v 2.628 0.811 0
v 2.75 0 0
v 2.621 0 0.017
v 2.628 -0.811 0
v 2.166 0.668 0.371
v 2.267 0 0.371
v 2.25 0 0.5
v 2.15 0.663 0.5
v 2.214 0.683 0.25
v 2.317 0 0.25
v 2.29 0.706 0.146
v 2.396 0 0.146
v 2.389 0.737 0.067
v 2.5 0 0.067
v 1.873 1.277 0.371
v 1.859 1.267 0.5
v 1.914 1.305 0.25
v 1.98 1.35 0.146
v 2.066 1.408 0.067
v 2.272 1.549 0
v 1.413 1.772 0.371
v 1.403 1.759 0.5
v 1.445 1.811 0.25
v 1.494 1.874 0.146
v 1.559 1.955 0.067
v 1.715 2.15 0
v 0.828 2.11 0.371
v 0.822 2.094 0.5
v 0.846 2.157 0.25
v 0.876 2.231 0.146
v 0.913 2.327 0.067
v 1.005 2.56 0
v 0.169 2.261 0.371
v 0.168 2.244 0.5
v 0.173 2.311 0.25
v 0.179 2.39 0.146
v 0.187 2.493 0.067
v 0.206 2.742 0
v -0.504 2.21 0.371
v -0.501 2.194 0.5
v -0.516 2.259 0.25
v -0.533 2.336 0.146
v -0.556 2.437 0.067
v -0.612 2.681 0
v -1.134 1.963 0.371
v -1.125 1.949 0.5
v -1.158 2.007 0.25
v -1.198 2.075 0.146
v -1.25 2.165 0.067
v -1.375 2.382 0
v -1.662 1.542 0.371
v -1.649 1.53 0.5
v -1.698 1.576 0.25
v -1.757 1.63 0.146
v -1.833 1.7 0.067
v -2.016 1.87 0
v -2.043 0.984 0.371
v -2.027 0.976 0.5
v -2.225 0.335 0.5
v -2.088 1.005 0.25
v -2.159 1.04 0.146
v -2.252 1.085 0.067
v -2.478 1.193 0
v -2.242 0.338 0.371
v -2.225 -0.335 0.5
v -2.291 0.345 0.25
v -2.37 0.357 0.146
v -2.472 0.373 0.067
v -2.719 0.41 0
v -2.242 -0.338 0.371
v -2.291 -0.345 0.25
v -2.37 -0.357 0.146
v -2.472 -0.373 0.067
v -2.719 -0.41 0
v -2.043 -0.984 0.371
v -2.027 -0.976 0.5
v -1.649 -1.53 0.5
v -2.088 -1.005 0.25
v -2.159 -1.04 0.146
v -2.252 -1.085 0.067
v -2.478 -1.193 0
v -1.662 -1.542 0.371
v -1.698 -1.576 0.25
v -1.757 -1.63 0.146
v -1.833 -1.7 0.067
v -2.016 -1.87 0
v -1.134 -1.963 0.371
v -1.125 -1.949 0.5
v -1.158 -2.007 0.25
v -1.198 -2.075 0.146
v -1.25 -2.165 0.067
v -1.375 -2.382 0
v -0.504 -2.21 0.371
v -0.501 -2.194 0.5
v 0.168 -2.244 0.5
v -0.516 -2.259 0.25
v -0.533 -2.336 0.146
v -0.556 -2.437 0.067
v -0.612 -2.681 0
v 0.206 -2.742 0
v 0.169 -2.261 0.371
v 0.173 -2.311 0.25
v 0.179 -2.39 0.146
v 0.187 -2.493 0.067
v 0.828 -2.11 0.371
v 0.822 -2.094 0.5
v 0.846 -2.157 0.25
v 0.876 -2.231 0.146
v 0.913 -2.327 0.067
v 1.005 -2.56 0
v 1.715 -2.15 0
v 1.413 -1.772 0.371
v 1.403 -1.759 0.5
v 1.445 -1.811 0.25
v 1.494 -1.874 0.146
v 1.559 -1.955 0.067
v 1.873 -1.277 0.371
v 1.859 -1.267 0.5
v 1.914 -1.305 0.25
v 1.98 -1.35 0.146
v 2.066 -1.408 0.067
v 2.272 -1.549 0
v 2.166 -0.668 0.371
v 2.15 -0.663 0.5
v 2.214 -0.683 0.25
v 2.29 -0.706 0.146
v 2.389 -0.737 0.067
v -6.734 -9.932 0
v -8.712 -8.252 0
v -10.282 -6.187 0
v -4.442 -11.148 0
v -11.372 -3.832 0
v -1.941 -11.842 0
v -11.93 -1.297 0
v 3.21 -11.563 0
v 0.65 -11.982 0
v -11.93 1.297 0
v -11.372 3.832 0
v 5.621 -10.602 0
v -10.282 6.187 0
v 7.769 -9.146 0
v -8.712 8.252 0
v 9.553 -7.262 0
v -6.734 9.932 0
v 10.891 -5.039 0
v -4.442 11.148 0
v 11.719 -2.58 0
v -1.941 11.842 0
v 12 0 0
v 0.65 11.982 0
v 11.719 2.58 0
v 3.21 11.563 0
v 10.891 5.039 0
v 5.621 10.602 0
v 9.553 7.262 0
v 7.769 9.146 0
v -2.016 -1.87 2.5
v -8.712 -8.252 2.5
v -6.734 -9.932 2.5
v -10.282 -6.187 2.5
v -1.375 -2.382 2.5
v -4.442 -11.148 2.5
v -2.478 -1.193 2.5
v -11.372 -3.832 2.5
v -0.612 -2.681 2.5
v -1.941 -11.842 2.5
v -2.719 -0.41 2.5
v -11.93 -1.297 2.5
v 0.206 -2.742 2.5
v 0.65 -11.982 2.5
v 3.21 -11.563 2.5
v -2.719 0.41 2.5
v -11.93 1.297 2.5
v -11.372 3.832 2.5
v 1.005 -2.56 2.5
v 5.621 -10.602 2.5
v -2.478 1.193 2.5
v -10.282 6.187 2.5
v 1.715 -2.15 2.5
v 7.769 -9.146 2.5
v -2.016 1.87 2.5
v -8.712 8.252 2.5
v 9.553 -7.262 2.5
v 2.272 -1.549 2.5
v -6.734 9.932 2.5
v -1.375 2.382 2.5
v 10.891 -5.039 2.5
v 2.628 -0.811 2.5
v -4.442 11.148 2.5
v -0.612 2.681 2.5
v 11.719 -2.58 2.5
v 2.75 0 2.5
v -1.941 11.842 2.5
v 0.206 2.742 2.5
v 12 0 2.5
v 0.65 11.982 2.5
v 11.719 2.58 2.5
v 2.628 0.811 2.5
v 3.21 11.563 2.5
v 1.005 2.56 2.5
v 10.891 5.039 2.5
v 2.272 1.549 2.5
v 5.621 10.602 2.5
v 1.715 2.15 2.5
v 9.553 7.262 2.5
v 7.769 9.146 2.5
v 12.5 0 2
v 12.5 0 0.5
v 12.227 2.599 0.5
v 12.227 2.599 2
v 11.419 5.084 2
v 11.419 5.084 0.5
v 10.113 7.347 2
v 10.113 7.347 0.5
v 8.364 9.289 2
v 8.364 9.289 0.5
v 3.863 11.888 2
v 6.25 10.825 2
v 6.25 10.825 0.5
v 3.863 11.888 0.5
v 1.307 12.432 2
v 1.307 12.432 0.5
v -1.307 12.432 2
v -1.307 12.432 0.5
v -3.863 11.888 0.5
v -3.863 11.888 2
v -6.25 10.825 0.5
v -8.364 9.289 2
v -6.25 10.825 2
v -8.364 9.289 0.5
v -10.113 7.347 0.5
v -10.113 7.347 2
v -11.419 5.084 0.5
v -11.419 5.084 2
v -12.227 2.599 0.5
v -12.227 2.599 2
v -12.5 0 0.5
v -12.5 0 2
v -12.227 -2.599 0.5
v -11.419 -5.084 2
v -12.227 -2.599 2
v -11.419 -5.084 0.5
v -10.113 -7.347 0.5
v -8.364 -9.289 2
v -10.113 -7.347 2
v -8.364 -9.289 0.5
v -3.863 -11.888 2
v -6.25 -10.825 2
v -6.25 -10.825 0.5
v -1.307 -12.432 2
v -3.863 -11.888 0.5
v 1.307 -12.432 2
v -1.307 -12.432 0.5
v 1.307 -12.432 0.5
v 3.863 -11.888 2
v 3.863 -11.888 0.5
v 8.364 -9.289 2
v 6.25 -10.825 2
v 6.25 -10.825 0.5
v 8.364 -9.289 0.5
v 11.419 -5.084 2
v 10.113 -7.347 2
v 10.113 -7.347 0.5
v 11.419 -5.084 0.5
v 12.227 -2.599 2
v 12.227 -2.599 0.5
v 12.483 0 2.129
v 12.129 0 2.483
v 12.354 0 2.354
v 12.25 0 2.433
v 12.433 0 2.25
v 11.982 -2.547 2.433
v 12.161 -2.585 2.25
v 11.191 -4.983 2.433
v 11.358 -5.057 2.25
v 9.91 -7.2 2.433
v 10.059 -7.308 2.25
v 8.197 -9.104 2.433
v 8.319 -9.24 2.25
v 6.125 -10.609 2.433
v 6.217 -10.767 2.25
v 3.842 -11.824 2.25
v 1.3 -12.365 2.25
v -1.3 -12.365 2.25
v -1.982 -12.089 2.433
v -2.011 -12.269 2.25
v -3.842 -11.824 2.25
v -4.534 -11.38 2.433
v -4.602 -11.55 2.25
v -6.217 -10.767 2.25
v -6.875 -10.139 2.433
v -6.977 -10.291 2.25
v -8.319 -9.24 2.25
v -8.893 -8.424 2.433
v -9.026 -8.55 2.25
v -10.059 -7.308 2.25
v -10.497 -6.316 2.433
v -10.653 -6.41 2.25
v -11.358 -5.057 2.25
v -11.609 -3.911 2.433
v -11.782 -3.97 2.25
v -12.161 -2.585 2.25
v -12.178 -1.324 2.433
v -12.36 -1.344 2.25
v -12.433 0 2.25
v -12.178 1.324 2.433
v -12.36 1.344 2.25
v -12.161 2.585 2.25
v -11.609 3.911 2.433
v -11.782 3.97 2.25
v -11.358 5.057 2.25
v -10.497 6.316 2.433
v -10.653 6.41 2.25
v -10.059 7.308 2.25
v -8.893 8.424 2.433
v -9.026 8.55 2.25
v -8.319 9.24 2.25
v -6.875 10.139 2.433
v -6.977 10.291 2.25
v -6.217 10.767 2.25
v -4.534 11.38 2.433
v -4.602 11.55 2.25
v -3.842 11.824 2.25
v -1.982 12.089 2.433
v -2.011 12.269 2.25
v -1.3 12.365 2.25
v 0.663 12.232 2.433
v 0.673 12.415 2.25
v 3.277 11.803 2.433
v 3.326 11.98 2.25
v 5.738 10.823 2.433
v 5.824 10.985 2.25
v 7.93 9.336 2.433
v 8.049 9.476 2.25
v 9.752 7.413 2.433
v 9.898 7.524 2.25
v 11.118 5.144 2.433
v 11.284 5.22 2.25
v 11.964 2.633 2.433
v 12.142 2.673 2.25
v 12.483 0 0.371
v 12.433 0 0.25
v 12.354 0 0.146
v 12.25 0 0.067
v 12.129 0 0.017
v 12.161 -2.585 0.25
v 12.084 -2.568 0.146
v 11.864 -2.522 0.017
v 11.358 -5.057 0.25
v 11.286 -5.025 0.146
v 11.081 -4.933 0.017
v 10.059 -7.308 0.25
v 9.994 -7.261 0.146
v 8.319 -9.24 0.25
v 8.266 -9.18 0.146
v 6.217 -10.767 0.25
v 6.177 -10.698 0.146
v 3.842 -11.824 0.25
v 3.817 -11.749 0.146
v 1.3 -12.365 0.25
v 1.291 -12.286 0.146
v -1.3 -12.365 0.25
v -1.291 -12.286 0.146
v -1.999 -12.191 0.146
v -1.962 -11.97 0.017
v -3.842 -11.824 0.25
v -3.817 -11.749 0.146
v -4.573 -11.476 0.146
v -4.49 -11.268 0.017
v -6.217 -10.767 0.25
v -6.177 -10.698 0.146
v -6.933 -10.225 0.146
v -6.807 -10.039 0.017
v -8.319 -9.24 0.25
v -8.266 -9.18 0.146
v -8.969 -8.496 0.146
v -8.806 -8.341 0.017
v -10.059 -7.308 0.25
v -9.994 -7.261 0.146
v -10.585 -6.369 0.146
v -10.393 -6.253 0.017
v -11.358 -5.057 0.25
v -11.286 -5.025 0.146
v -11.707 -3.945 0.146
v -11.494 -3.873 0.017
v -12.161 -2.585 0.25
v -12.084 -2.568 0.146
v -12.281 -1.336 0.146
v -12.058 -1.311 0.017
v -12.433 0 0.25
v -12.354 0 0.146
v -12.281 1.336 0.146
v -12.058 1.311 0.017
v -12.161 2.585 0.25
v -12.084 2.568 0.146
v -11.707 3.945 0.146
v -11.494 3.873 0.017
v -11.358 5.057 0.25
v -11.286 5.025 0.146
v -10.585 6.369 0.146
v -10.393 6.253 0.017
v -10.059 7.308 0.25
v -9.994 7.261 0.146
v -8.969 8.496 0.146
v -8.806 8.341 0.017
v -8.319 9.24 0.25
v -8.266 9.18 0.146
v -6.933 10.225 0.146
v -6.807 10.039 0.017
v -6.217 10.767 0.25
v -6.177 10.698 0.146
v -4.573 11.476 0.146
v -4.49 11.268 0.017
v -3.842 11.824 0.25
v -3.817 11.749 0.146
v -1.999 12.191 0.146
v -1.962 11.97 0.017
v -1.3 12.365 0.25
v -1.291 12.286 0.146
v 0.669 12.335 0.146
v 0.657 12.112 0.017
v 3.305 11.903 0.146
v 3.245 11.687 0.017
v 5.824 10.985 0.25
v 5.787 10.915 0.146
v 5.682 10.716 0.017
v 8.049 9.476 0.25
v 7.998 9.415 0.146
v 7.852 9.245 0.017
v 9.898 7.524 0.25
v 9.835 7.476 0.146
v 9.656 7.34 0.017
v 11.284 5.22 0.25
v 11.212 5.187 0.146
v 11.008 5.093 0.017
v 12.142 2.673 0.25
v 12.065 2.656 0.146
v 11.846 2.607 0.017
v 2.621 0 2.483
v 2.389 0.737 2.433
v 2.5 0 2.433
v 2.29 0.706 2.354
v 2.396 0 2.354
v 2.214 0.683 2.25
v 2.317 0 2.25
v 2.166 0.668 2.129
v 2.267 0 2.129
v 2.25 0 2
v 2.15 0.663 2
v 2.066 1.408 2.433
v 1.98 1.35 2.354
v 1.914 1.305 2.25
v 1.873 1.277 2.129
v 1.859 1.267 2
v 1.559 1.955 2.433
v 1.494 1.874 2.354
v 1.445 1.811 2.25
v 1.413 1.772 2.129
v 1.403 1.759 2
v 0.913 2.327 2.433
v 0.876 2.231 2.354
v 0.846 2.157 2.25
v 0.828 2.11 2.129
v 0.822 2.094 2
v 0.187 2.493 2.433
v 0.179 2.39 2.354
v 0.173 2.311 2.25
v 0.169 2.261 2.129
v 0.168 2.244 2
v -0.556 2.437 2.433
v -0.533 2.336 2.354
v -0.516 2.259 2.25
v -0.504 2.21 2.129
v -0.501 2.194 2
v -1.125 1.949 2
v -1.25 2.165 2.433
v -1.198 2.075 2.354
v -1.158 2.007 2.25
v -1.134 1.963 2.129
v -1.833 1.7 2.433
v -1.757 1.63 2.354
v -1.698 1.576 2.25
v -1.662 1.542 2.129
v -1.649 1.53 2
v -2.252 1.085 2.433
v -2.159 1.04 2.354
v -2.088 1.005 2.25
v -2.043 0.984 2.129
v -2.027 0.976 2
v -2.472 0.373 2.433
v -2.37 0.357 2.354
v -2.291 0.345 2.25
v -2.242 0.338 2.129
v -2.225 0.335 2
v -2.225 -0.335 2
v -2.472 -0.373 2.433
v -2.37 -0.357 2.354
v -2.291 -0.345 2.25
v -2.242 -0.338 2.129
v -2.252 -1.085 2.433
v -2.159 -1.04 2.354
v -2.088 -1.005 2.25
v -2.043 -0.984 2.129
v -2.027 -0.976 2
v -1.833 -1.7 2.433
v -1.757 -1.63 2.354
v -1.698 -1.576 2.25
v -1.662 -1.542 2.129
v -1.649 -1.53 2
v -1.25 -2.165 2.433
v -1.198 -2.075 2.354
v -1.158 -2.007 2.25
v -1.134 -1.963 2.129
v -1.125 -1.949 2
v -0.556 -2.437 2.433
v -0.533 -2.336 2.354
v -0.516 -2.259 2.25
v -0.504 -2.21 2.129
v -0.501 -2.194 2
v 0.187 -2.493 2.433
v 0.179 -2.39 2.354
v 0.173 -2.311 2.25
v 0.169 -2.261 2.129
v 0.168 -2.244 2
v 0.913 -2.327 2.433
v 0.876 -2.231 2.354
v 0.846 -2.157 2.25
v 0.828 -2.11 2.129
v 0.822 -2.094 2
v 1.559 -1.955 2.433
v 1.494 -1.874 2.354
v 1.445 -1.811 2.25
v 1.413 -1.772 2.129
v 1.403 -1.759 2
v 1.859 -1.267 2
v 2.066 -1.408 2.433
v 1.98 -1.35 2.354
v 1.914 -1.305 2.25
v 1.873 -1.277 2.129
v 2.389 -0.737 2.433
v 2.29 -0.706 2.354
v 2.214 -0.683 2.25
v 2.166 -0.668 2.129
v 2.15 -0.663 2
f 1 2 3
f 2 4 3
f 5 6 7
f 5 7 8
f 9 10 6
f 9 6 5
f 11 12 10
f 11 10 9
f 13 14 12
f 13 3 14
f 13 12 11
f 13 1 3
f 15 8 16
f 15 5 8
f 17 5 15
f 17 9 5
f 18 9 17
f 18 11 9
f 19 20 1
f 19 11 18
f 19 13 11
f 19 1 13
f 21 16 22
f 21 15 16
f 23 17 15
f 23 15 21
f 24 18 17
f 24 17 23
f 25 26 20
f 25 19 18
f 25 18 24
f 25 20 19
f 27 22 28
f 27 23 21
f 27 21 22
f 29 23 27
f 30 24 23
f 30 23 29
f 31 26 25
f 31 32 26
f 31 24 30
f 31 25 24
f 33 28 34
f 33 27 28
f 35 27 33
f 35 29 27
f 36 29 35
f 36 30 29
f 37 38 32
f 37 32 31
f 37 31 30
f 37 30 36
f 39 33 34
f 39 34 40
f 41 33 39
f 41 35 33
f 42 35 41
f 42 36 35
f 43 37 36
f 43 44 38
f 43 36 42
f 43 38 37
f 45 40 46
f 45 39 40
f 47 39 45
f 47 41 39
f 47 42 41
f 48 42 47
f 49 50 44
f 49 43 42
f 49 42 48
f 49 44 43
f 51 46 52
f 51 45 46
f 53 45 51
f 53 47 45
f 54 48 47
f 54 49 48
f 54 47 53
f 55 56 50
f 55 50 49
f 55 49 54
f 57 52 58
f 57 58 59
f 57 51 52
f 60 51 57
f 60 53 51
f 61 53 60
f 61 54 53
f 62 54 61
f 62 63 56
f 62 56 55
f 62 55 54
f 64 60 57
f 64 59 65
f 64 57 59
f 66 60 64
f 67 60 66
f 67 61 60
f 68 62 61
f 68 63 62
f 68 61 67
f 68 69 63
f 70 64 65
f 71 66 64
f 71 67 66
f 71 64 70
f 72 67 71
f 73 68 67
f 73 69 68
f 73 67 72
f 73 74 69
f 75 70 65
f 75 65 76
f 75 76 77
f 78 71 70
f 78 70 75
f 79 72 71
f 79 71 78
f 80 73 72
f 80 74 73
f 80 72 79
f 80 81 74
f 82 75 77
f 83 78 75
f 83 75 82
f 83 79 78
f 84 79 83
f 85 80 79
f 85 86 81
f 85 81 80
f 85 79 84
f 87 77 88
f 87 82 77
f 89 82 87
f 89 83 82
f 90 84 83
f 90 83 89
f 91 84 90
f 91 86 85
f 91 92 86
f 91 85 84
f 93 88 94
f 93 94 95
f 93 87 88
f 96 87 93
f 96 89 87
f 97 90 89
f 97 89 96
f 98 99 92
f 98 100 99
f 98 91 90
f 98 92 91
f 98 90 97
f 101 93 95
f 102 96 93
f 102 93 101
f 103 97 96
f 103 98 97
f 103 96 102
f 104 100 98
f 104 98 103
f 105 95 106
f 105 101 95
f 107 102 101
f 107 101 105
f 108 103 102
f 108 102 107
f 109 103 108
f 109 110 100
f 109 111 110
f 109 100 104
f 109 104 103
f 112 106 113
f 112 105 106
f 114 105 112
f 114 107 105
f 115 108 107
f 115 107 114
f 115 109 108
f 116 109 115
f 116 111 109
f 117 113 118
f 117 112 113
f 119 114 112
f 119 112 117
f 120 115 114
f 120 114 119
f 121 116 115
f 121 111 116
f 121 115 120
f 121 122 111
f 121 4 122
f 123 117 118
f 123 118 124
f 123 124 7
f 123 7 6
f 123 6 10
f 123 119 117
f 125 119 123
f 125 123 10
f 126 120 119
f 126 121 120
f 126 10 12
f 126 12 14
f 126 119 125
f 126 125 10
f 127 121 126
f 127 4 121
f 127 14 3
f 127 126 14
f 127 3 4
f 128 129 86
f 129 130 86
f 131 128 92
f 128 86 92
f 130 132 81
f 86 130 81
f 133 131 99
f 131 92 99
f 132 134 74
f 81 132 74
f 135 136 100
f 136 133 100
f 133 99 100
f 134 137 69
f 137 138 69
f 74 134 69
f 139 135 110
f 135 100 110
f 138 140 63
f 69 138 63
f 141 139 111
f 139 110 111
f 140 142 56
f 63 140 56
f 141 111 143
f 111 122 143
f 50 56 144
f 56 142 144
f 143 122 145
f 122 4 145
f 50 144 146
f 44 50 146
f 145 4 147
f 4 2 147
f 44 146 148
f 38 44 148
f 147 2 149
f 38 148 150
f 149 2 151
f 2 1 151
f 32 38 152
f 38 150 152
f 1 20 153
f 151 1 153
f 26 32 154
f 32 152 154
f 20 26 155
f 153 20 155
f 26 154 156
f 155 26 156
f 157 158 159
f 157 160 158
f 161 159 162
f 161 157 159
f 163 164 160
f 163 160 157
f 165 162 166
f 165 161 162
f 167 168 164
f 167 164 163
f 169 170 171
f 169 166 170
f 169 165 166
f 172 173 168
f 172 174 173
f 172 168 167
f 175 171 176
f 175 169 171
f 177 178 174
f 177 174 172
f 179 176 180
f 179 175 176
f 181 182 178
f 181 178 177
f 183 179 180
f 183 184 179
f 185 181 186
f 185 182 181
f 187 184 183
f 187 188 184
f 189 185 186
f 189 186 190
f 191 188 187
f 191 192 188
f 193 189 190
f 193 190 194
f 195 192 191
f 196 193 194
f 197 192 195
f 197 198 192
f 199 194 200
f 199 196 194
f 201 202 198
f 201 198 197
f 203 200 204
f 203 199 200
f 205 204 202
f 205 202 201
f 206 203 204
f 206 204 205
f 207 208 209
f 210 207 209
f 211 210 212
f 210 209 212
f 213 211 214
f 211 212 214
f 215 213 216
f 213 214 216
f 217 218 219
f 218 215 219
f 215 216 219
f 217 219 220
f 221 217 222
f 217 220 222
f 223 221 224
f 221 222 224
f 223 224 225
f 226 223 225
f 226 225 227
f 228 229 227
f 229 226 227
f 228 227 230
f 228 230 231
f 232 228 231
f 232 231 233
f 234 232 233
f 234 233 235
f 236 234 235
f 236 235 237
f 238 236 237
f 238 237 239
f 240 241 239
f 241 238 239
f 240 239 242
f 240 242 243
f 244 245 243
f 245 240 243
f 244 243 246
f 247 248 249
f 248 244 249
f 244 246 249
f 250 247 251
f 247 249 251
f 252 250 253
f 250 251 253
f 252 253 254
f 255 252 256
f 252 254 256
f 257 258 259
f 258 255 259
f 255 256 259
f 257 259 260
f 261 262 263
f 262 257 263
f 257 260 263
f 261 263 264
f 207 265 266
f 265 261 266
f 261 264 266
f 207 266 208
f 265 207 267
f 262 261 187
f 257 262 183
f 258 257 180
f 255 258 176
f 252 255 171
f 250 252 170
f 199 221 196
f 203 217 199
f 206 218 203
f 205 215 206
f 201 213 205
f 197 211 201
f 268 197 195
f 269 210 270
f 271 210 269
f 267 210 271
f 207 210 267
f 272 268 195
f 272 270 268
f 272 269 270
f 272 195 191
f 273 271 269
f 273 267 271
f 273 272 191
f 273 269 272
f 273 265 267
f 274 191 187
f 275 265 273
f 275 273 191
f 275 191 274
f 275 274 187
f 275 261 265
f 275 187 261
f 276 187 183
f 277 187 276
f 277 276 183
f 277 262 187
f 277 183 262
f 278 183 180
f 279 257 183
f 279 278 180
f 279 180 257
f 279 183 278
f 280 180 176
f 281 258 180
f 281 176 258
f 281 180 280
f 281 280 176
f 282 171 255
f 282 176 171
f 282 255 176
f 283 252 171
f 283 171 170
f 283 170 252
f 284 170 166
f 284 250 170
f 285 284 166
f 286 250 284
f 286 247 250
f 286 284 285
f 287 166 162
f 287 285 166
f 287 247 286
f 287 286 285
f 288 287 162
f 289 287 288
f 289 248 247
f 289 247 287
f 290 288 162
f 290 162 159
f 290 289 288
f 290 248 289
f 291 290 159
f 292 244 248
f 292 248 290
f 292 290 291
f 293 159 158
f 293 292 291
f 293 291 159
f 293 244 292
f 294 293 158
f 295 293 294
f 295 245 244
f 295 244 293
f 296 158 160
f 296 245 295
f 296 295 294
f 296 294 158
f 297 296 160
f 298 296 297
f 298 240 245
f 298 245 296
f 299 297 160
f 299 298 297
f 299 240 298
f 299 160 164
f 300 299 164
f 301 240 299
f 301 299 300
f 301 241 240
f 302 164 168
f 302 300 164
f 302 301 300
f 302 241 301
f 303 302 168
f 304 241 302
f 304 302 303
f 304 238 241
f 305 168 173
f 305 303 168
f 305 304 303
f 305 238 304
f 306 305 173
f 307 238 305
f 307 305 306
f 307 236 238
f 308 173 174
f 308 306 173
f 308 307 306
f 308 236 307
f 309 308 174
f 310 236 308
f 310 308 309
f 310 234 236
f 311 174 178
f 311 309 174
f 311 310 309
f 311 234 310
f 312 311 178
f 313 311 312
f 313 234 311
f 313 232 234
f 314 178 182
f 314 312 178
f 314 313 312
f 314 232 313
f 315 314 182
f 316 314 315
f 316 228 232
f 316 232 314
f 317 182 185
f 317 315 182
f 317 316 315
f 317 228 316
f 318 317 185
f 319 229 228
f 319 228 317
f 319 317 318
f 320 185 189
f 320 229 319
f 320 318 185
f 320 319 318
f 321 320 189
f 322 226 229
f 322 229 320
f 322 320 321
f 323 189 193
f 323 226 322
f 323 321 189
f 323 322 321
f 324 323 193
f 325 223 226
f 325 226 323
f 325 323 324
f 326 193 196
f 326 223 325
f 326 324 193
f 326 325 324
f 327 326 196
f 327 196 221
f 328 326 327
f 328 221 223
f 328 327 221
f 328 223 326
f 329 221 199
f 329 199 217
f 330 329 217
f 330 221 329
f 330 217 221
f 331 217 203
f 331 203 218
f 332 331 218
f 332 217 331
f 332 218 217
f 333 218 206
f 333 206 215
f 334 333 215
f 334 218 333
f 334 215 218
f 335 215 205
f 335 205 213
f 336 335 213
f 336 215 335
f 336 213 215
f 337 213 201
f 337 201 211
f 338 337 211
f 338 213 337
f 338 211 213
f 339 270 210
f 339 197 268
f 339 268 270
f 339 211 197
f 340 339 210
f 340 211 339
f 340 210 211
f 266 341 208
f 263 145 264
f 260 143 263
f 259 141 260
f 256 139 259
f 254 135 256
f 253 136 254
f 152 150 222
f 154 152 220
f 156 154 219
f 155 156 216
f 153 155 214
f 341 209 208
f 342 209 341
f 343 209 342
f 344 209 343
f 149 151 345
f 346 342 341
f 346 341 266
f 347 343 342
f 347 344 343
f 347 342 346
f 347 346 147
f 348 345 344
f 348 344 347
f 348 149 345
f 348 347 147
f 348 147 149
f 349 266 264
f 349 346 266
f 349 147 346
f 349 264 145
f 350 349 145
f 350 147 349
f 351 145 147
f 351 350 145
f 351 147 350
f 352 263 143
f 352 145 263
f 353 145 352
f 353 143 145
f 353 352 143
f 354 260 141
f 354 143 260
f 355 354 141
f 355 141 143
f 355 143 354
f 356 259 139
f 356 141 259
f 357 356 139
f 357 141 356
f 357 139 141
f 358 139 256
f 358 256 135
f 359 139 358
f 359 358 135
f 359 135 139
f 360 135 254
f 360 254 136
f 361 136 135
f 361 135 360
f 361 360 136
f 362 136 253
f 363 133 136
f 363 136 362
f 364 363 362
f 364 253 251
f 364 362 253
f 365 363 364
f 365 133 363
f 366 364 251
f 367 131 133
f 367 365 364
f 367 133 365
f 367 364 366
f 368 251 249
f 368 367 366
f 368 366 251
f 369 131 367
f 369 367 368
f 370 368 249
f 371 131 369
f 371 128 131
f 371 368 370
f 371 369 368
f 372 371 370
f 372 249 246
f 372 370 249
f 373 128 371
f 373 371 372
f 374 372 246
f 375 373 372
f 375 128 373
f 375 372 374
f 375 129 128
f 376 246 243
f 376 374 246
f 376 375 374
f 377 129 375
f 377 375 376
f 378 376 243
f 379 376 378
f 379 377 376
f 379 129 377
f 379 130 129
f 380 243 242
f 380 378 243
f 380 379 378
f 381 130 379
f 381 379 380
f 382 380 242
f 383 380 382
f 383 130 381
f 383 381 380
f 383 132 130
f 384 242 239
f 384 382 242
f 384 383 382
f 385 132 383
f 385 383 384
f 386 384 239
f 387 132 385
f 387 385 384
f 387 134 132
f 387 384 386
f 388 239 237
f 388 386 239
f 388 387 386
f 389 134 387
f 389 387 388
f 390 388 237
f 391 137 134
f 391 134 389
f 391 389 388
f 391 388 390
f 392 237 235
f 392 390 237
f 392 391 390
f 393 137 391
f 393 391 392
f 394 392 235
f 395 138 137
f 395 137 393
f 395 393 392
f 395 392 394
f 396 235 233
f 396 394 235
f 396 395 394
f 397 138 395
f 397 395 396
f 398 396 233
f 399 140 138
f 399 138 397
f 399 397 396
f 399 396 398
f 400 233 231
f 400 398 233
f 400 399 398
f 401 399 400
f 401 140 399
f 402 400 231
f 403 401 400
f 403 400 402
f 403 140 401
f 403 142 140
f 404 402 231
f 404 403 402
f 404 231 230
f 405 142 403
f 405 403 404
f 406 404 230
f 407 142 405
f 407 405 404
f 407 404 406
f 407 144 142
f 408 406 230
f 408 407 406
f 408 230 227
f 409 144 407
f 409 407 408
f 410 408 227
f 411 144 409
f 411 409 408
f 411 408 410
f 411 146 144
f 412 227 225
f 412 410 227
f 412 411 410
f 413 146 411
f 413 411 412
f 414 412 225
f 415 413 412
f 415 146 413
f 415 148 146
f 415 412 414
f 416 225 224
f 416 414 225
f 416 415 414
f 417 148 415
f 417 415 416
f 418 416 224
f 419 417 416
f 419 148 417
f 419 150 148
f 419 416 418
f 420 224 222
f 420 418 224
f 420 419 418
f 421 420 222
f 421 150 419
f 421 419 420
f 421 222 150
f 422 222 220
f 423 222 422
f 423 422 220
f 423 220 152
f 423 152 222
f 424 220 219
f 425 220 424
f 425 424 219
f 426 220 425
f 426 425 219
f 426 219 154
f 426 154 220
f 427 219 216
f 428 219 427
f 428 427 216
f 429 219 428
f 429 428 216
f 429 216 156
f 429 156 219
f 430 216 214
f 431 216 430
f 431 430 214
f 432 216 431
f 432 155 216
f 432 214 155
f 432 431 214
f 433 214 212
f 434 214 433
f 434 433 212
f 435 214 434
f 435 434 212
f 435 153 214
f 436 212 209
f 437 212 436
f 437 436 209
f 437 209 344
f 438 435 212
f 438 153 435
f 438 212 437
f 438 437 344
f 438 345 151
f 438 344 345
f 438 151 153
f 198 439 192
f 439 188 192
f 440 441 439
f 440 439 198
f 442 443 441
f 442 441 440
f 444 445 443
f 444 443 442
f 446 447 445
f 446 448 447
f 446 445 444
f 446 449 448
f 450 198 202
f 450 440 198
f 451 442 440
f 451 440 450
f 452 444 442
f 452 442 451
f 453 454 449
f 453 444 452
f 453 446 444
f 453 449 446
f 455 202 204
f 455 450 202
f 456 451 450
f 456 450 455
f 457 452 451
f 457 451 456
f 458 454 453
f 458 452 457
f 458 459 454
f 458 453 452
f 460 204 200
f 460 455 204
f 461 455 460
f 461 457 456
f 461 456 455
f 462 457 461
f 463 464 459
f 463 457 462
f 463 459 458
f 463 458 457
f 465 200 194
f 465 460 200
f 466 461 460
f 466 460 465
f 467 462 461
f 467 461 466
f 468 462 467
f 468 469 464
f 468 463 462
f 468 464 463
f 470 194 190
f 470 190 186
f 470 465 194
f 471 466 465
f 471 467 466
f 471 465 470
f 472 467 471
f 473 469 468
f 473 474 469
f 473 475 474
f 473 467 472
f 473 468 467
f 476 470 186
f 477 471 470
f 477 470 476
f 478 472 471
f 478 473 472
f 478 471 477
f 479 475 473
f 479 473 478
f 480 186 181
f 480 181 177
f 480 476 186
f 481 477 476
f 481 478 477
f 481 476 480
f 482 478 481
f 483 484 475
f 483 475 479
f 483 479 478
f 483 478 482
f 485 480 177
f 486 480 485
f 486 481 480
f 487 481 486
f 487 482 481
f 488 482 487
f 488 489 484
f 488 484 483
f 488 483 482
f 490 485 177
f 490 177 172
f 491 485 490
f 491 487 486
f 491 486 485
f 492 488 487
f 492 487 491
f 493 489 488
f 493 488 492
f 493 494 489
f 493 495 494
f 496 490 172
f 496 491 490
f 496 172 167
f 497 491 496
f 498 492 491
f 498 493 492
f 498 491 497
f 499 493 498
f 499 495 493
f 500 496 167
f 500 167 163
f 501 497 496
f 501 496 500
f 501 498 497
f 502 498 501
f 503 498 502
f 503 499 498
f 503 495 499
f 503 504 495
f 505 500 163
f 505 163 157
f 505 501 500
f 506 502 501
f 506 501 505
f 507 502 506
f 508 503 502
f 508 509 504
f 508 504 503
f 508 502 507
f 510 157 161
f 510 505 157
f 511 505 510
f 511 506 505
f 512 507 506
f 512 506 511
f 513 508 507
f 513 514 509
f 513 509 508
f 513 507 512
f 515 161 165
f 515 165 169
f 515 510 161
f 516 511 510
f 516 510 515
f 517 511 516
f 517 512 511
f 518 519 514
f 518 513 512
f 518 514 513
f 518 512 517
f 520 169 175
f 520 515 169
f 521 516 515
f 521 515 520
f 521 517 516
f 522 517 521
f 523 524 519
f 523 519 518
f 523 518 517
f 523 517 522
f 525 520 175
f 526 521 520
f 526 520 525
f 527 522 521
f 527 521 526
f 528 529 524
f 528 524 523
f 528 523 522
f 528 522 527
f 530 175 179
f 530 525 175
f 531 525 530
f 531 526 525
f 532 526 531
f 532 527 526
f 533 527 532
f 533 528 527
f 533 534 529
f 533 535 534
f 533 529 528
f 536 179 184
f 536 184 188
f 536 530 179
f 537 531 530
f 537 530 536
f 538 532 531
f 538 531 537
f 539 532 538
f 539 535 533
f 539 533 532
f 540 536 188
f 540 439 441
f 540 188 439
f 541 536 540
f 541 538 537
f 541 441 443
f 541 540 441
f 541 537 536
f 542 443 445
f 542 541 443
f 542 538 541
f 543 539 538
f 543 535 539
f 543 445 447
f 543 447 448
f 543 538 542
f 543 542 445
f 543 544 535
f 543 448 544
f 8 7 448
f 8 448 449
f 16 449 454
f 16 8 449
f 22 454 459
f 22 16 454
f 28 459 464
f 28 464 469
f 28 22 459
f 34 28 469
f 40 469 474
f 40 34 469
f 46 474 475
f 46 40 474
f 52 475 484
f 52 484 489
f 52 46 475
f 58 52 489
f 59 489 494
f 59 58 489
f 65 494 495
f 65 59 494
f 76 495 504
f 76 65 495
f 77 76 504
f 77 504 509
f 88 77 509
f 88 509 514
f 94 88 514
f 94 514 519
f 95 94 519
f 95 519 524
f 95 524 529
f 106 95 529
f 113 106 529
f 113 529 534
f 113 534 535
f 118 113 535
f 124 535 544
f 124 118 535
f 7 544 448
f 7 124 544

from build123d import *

# Parameters (mm, degrees)
SKETCH1_R               = 45
SKETCH1_R_2             = 2.25
SKETCH1_R_3             = 1.75
BOSS_EXTRUDE1_DEPTH     = 2.5
SKETCH2_R               = 29.85
SKETCH2_R_2             = 12.65
BOSS_EXTRUDE2_DEPTH     = 1
CUT_EXTRUDE1_DEPTH      = 64.688696014
CUT_EXTRUDE1_DEPTH_BACK = 64.688696014
SKETCH3_R               = 45
SKETCH3_R_2             = 12.5
FILLET1_R               = 0.5


with BuildPart() as part:
    # Sketch1 → Boss-Extrude1 (new body)
    with BuildSketch(Plane.XY):
        Circle(SKETCH1_R)
        Circle(SKETCH1_R_2, mode=Mode.SUBTRACT)
        with Locations((0, 33.5)):
            Circle(SKETCH1_R_3, mode=Mode.SUBTRACT)
        with Locations((33.5, 0)):
            Circle(SKETCH1_R_3, mode=Mode.SUBTRACT)
        with Locations((0, -33.5)):
            Circle(SKETCH1_R_3, mode=Mode.SUBTRACT)
        with Locations((-33.5, 0)):
            Circle(SKETCH1_R_3, mode=Mode.SUBTRACT)
    extrude(amount=BOSS_EXTRUDE1_DEPTH)

    # Sketch2 → Boss-Extrude2 (add)
    with BuildSketch(Plane(origin=(0, 0, 0), x_dir=(-1, 0, 0), z_dir=(0, 0, -1))):
        Circle(SKETCH2_R)
        Circle(SKETCH2_R_2, mode=Mode.SUBTRACT)
    extrude(amount=BOSS_EXTRUDE2_DEPTH)

    # Sketch3 → Cut-Extrude1 (cut, two sides: drawn at the far end of the back side and taken through both)
    with BuildSketch(Plane.XY.offset(-CUT_EXTRUDE1_DEPTH_BACK)):
        Circle(SKETCH3_R)
        Circle(SKETCH3_R_2, mode=Mode.SUBTRACT)
    extrude(amount=CUT_EXTRUDE1_DEPTH + CUT_EXTRUDE1_DEPTH_BACK, mode=Mode.SUBTRACT)

    # Fillet1
    fillet1_edges = [part.edges().sort_by_distance(p)[0] for p in [
        (-12.5, 0, 2.5),
        (-12.5, 0, 0),
        (-2.25, 0, 0),
        (-2.25, 0, 2.5),
    ]]
    fillet(fillet1_edges, radius=FILLET1_R)


solid = part.part
